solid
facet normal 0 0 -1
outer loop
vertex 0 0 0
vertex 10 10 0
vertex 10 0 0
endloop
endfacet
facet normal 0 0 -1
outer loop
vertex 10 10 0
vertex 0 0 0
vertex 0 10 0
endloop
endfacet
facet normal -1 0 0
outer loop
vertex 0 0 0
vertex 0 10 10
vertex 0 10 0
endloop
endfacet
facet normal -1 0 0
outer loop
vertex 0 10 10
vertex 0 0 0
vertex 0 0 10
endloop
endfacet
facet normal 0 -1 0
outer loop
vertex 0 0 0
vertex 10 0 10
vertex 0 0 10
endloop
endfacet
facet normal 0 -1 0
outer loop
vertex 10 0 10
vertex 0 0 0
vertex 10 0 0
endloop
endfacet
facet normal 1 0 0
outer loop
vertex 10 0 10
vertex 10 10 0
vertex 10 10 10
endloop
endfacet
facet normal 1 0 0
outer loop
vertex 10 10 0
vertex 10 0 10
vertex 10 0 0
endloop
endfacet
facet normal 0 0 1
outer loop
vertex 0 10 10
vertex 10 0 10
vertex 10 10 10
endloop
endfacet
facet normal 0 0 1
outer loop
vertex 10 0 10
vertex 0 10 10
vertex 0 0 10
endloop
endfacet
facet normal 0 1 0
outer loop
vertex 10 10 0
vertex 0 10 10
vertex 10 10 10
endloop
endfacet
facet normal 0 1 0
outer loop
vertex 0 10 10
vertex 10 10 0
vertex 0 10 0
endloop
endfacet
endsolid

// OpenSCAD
//Author: Chris Correll
//Date: 8/18/22
//Description: Lesson 1.0 Introduction to OpenSCAD

/*
Explain what openSCAD is, have student read the terminology text file
*/  

/*
Explain what a comment is: computer ignores code that follows on the same line as a single line comment or is in a comment block
//single line comment
/* 
Multi-line
comment block
*/

/* 
Explore the program. Explain the different windows and what they do: editor window-where to write code, preview window-where to see code, tab bar ( can open ,multiple code documents and tab and use tab navigation commands ctrl +tab to switch bewteen them), console- where text output about your code shows upwhen you preview or render it, error-log- a table that describes what and where errors are that show in your code
*/

/* 
Helpful JAWS and Windows commands for text editing:
If JAWS stops reading try focusing the menu bar and then pressing escape or focusing the editor window
Move cursor by word: CTRL + LEFT/RIGHT ARROW key
Move cursor to start of line: HOME (FN + LEFT ARROW KEY on most laptops)
Move cursor to end of line: END (FN + RIGHT ARROW KEY on most laptops)
Move cursor to beginning of file: CTRL + END
Move cursor to end of file: CTRL + HOME
Select: HOLD SHIFT AND MOVE CURSOR
Change punctuation level: JAWS KEY + SHIFT + 2
Read all from cursor: JAWS KEY + A
Read Current line: JAWS KEY + UP ARROW
Temporarily increase/decrease voice rate: ALT + CTRL + PAGE UP/PAGE DOWN (fn key and up/ down arrow on most laptops)
Spell curent line: JAWS KEY + UP ARROW twice quickly

*/

/*
NOTE:
We will be exploring VS code later in the semester as an alternative to working in the OpenSCAD editor as it is sometimes buggy with JAWS. Remmember to change focus to the menu bar and press esc if JAWS stops reading the openSCAD editor
*/

/* 
Exploring the Menus
ALT will focus the menu bar
You can use first letter navigation to get to things quickly i.e. the layered key stroke ALT > w > e will bring you to the 
Have students Focus the different windows (console, editor, error log)
*/
 
/*
Optional Customization (perhaps not accessible?)
Edit > Preferences > Editor > Auto indent off
Edit > Preferences > Editor > Number Scroll Via Mouse Wheel off 
Edit > Preferences > Editor > Autocomplete off
Edit > Preferences > Advanced > Show Welcome Screen off
Design > Turn off automatic reload and preview
View > Hide 3D view and Editor tool bars
Window > Hide console
*/

/*
First shape cube
Talk about parameters
Rendering 
Exporting to stl etc.
*/

//Your first shape preview it and then try the below preview keyboard commands
cube([1,1,1]);

//You can fit the shape to the whole preview window with the command control + shift + v (alt > v > view all)
//You can change the view projection using ctrl + 4 through 9
//Once completed comment out the code with a single line comment
//Make a larger cube render it, export it as an stl email it to me

//Talk about scaling have braille rulers show students 
// openSCAD is unitless but we can assume that we will be working with one unit= 1mm
cube([10,10,10]);    
